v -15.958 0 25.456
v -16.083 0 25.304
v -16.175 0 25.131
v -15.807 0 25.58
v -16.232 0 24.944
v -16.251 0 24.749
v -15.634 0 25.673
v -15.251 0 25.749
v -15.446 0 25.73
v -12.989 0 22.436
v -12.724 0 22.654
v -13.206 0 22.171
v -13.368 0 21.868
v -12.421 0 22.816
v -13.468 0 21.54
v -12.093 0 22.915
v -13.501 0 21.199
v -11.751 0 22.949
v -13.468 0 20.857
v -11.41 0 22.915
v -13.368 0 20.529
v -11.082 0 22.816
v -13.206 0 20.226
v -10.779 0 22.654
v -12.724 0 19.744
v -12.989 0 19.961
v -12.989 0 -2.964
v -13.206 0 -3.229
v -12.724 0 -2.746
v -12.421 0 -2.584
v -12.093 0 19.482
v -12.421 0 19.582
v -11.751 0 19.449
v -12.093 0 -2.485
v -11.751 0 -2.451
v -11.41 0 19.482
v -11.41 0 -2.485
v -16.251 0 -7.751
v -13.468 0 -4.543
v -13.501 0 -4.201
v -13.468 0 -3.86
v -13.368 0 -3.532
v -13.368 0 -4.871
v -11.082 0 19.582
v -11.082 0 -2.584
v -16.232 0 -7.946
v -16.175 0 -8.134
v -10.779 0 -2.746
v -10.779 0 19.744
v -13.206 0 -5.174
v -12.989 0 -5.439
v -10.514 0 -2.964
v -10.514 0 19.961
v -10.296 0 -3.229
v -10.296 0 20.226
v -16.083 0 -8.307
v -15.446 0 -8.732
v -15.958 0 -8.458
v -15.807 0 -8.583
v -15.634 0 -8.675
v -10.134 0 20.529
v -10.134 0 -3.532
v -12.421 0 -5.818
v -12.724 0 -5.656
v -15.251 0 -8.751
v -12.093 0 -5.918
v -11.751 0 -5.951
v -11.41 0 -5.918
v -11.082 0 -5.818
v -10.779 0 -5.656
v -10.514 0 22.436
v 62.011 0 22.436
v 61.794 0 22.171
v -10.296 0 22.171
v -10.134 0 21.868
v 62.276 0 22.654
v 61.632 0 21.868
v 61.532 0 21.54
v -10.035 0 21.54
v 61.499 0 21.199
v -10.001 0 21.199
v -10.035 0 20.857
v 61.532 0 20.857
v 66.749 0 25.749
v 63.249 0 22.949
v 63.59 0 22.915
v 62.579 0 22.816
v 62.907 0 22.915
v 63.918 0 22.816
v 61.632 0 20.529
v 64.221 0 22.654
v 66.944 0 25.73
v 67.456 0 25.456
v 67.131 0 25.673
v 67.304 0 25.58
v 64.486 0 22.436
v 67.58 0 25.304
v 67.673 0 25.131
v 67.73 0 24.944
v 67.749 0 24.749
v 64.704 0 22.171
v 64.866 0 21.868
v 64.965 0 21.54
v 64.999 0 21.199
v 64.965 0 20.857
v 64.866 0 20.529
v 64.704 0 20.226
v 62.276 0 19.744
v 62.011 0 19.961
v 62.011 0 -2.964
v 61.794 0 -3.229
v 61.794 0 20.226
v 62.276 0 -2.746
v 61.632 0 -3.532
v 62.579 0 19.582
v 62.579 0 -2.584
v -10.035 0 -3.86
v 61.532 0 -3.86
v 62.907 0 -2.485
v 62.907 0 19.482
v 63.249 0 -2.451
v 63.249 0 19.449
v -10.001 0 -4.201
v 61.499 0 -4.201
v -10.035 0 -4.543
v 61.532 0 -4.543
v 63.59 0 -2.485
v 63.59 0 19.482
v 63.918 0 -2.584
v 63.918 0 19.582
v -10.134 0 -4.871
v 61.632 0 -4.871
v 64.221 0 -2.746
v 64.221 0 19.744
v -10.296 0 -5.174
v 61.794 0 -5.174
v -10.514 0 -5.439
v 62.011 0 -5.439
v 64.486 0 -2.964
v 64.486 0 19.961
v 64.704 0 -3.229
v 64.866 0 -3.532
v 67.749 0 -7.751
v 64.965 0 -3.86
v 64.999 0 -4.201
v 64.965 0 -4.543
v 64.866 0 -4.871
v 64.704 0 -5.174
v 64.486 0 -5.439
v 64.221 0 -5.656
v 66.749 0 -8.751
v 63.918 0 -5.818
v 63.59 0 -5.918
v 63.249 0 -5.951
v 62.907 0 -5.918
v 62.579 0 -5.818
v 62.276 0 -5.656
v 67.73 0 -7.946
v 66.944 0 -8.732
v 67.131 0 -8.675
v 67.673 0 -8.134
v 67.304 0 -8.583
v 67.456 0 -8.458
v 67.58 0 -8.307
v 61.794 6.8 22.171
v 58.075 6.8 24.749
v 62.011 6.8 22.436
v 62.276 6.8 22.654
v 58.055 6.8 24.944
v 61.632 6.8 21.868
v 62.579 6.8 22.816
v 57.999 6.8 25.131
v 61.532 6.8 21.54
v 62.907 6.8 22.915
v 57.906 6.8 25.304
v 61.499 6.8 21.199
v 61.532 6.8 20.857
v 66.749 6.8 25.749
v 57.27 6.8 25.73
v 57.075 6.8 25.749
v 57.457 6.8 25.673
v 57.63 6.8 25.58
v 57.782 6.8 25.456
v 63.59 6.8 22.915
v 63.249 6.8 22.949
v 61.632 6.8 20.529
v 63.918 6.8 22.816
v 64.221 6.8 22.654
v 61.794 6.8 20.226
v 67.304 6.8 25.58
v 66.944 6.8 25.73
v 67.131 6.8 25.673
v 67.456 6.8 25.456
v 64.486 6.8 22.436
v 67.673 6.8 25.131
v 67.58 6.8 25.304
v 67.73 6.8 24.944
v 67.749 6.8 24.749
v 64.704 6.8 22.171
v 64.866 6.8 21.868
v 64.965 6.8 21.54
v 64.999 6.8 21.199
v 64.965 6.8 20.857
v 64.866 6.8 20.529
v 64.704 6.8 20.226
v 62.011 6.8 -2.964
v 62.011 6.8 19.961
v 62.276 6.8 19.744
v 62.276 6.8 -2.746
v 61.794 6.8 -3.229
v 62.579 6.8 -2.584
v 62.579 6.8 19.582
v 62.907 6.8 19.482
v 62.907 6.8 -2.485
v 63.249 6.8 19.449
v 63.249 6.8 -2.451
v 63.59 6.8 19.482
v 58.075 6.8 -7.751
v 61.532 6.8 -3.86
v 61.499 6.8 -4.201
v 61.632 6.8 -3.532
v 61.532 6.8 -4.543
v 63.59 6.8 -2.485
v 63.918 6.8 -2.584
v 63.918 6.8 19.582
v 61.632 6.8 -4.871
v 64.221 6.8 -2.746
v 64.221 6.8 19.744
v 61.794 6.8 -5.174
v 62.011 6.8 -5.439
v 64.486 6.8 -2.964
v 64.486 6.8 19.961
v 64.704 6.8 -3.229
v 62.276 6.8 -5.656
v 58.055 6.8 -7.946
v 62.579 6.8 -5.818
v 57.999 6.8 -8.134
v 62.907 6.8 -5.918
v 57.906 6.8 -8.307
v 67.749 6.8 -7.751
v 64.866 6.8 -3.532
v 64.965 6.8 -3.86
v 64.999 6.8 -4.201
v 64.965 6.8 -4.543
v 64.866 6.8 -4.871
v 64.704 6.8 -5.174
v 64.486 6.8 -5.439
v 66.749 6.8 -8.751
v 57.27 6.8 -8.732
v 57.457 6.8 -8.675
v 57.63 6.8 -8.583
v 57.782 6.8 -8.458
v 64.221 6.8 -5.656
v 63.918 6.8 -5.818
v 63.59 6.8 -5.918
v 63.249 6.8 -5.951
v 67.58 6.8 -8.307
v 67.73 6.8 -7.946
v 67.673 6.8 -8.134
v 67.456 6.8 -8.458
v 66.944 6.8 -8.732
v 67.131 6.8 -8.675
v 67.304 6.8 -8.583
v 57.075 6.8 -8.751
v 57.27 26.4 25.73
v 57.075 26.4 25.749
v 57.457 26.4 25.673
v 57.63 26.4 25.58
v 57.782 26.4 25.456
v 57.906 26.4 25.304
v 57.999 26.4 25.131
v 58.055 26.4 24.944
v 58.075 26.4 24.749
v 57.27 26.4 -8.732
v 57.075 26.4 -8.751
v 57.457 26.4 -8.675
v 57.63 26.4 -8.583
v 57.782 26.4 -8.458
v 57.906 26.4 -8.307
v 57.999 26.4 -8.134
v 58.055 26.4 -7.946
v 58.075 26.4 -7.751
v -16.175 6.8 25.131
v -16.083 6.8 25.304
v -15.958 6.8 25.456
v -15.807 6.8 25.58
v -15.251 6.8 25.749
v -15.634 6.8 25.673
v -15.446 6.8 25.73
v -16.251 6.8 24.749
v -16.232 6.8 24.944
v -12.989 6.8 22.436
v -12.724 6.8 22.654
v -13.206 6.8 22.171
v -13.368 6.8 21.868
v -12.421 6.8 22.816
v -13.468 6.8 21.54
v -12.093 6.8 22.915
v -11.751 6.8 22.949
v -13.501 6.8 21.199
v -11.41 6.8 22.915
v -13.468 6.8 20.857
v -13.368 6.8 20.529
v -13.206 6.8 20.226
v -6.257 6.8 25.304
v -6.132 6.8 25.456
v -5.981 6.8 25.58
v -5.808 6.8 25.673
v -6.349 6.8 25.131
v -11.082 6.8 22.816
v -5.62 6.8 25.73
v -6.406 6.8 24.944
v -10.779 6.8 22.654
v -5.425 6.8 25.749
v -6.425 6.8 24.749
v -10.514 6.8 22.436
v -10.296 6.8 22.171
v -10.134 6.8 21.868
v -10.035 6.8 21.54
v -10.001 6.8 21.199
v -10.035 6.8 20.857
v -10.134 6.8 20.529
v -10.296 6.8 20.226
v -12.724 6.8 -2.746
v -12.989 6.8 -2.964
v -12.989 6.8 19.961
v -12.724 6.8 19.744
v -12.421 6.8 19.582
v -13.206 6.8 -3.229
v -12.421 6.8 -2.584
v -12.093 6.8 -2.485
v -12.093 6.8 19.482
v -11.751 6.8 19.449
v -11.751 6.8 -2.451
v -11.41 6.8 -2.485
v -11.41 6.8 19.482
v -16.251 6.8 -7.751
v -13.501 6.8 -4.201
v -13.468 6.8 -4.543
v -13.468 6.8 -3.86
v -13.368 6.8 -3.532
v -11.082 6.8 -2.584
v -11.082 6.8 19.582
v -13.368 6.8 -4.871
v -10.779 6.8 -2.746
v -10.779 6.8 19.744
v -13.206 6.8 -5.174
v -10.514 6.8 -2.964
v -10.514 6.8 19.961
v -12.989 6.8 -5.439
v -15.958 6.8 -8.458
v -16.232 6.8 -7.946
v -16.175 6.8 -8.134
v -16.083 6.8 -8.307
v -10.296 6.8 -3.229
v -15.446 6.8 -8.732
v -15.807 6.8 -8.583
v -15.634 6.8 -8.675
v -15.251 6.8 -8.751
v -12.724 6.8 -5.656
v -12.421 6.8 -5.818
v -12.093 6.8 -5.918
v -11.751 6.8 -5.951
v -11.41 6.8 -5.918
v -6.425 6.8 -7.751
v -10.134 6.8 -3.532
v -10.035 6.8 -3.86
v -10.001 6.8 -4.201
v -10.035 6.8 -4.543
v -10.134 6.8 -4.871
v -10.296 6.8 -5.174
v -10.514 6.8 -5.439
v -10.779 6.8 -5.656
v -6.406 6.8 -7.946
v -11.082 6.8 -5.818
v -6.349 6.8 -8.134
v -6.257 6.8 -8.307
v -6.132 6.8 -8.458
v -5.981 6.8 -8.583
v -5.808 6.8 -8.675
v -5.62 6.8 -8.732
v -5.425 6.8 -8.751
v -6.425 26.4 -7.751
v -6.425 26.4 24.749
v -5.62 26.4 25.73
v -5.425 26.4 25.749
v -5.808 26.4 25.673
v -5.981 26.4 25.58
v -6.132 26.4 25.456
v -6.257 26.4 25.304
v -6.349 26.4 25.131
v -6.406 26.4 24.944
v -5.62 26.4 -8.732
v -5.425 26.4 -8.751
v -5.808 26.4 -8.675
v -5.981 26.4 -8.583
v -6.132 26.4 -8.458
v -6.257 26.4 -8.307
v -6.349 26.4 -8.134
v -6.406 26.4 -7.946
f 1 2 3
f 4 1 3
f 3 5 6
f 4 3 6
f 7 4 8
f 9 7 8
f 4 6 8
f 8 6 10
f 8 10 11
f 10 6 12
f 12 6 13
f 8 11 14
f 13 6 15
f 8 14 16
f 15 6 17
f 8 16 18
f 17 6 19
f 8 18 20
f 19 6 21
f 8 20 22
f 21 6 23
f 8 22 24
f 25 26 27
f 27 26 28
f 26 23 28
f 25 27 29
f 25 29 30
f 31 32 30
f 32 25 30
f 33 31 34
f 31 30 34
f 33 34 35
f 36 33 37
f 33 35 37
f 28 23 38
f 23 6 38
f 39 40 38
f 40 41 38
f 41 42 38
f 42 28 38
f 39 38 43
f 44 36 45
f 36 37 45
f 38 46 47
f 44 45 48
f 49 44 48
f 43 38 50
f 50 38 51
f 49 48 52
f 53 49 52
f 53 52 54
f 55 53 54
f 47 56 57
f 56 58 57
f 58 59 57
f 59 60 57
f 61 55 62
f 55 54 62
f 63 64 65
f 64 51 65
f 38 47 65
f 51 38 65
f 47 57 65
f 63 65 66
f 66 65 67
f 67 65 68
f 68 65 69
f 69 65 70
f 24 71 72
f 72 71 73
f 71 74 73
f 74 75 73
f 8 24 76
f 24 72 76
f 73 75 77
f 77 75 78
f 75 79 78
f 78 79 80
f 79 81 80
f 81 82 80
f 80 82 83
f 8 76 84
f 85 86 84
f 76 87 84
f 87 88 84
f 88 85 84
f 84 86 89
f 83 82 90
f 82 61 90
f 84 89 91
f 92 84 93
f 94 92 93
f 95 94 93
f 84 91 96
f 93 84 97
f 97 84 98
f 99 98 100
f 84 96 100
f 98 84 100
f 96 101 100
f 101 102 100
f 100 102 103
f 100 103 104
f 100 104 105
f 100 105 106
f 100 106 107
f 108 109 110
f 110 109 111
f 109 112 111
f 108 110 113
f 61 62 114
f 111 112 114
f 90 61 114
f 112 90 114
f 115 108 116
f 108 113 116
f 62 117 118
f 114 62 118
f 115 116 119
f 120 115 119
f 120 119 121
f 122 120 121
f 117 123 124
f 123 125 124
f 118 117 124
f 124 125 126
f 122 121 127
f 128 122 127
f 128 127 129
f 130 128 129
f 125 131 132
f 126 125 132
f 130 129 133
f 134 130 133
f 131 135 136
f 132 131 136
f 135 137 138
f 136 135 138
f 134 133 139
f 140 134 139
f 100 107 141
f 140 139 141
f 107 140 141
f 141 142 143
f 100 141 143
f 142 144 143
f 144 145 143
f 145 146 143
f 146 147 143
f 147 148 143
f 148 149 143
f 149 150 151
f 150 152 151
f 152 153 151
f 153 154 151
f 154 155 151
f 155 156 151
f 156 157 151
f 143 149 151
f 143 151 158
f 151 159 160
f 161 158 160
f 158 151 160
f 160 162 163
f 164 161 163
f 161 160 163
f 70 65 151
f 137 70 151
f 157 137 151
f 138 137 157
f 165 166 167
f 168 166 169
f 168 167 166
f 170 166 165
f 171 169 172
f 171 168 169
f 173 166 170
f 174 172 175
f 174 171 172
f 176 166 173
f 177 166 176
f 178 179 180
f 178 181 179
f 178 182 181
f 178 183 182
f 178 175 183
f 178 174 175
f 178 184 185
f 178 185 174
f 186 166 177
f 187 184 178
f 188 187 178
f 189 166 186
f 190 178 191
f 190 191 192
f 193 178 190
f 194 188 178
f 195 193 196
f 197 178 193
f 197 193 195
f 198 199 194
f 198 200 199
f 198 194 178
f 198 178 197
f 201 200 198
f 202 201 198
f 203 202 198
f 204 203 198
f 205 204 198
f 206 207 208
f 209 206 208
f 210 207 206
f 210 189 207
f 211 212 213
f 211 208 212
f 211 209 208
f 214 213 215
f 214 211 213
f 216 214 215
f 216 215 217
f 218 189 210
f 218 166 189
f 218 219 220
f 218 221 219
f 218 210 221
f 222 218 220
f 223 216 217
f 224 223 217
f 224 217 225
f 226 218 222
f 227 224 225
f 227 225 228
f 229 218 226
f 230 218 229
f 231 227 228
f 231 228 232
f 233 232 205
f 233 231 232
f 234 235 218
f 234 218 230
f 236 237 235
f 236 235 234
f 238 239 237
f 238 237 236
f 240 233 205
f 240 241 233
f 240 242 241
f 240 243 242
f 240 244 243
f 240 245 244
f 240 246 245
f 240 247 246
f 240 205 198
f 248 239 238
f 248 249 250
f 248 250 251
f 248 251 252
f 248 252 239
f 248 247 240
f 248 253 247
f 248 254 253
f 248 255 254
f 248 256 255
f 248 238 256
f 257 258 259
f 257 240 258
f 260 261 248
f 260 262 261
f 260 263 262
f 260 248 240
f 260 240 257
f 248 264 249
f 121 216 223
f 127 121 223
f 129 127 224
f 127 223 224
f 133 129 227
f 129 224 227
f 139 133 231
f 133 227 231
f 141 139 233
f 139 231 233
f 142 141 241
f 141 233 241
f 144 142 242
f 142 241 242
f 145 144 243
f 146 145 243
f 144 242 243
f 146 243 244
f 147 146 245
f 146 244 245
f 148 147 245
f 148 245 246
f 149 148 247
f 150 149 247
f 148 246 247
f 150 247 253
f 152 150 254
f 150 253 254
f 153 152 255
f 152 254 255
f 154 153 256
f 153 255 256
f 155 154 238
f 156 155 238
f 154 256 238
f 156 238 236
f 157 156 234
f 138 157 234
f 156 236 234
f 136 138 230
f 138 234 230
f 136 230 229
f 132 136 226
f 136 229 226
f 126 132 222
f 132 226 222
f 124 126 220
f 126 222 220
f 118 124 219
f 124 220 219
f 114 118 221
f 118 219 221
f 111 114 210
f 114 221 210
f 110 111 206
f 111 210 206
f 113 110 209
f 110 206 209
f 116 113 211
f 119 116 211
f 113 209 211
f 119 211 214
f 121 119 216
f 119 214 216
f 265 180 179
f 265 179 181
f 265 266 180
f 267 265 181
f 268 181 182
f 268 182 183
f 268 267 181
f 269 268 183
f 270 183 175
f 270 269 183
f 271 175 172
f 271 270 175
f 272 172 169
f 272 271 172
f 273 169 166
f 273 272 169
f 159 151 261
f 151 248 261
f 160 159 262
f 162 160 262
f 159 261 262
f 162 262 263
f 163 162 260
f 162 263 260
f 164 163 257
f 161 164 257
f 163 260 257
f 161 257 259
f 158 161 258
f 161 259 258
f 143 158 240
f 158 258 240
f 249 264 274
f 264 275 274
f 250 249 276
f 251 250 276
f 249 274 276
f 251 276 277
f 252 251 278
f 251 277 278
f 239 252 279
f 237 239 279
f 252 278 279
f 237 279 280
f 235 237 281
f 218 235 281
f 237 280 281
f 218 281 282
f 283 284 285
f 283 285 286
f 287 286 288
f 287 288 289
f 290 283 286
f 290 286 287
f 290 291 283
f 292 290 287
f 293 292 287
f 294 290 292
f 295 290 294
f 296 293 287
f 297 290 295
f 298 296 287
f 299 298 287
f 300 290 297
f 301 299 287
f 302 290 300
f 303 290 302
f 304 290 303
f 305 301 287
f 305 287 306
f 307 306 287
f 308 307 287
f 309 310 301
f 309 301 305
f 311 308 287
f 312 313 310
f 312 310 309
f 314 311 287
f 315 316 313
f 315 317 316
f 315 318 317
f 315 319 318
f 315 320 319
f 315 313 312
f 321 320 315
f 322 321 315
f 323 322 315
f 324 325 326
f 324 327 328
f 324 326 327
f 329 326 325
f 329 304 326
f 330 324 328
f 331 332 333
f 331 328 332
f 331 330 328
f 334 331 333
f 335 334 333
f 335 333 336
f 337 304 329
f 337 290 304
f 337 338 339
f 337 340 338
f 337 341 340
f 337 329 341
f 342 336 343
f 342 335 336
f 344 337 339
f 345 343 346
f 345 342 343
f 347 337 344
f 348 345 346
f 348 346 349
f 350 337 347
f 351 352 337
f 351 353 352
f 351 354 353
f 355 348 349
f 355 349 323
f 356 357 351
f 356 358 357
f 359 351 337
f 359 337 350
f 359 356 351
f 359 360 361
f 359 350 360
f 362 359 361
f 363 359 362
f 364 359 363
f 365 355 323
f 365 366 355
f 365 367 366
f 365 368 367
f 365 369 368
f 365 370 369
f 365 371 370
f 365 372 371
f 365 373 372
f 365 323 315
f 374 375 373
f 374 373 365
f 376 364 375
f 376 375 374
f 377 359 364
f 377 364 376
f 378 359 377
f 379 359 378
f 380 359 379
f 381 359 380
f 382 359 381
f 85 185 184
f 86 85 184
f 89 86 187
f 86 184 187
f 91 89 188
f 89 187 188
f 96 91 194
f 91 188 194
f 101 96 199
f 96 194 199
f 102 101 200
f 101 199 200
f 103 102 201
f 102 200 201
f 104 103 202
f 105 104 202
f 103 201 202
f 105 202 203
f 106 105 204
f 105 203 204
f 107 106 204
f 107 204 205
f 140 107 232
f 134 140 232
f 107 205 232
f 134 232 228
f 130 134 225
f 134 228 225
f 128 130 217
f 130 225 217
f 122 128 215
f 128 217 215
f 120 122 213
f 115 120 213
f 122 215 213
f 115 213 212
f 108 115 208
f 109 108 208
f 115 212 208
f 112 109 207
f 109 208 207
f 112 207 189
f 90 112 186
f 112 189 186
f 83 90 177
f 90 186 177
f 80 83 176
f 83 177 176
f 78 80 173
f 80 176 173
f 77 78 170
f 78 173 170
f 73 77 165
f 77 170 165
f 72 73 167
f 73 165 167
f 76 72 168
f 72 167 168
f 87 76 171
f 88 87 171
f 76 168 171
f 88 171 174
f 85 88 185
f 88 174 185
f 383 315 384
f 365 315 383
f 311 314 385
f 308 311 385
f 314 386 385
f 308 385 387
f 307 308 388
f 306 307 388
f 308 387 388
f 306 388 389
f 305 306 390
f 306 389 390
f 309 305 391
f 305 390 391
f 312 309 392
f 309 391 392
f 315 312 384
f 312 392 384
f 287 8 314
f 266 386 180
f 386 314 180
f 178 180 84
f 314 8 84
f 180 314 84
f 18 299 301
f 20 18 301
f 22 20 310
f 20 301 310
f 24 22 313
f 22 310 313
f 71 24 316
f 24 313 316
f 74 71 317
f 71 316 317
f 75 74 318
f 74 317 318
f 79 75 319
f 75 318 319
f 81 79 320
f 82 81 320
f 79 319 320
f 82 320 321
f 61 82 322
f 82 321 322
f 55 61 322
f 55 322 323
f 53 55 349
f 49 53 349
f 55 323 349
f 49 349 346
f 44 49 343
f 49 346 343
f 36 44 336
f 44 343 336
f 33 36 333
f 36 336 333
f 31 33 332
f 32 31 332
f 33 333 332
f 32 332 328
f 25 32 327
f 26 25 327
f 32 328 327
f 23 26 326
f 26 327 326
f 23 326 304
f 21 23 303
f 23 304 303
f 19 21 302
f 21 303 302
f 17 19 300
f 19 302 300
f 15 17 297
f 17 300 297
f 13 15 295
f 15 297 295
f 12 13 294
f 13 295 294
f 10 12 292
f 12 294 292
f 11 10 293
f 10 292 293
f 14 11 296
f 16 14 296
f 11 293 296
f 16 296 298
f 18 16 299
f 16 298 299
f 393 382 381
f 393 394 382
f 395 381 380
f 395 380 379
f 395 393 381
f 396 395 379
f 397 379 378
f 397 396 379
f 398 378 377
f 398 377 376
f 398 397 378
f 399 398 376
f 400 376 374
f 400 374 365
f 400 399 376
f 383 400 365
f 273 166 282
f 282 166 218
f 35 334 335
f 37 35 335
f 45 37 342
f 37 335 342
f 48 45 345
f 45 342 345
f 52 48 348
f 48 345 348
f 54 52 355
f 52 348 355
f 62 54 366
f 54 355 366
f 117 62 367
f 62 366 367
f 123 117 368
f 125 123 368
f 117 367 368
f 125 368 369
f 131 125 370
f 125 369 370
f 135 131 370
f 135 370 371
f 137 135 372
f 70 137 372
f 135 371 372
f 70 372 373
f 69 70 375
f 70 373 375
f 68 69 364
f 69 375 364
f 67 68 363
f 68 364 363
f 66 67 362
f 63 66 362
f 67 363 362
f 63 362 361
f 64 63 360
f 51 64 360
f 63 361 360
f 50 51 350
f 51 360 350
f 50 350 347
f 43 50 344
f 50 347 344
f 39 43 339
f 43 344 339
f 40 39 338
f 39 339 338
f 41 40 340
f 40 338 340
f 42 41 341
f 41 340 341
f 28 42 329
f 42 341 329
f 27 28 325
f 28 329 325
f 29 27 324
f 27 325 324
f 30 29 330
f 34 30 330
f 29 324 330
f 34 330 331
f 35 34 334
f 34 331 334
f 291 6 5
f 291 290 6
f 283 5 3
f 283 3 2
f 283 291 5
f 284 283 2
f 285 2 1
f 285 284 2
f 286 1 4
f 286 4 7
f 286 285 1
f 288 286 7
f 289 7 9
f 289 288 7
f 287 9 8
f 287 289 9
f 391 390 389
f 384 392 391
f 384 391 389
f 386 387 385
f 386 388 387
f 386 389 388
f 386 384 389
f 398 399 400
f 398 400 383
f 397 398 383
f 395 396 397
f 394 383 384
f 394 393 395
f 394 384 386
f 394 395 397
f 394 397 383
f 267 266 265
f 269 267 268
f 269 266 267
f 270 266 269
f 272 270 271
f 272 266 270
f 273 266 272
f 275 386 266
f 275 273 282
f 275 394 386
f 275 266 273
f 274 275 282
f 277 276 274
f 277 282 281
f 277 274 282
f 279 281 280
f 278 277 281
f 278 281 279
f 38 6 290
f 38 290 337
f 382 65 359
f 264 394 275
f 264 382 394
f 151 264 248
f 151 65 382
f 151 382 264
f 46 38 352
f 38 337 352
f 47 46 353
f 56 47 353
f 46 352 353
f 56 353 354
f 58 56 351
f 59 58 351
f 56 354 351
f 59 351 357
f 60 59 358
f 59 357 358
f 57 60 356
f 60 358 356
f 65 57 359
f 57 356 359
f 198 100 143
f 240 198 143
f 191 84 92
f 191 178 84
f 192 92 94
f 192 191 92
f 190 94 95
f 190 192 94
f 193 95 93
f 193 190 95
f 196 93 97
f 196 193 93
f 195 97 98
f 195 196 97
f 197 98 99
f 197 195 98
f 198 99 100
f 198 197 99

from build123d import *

# Parameters (mm, degrees)
SKETCH1_W           = 84
SKETCH1_H           = 34.5
BOSS_EXTRUDE1_DEPTH = 6.8
SKETCH2_W           = 64.5
SKETCH2_H           = 34.5
BOSS_EXTRUDE2_DEPTH = 19.6
SKETCH3_R           = 1.75
CUT_EXTRUDE1_DEPTH  = 6.8
FILLET1_R           = 1
FILLET2_R           = 1


with BuildPart() as part:
    # Sketch1 → Boss-Extrude1 (new body)
    with BuildSketch(Plane(origin=(0, 0, 0), x_dir=(1, 0, 0), z_dir=(0, 1, 0))):
        with Locations((25.748743719, -8.498743719)):
            Rectangle(SKETCH1_W, SKETCH1_H)
    extrude(amount=BOSS_EXTRUDE1_DEPTH)

    # Sketch2 → Boss-Extrude2 (add)
    with BuildSketch(Plane(origin=(0, 6.8, 0), x_dir=(1, 0, 0), z_dir=(0, 1, 0))):
        with Locations((25.824659205, -8.498743719)):
            Rectangle(SKETCH2_W, SKETCH2_H)
    extrude(amount=BOSS_EXTRUDE2_DEPTH)

    # Sketch3 → Cut-Extrude1 (cut)
    with BuildSketch(Plane(origin=(0, 6.8, 0), x_dir=(1, 0, 0), z_dir=(0, 1, 0))):
        with Locations(Location((63.248743719, 4.201256281, 0), (0, 0, 270))):
            Circle(SKETCH3_R)
        with Locations(Location((63.248743719, -21.198743719, 0), (0, 0, 270))):
            Circle(SKETCH3_R)
        with Locations(Location((-11.751256281, -21.198743719, 0), (0, 0, 270))):
            Circle(SKETCH3_R)
        with Locations(Location((-11.751256281, 4.201256281, 0), (0, 0, 270))):
            Circle(SKETCH3_R)
    extrude(amount=-CUT_EXTRUDE1_DEPTH, mode=Mode.SUBTRACT)

    # Fillet1
    fillet1_edges = [part.edges().sort_by_distance(p)[0] for p in [
        (-16.251256281, 3.4, -8.751256281),
        (67.748743719, 3.4, -8.751256281),
        (67.748743719, 3.4, 25.748743719),
        (-16.251256281, 3.4, 25.748743719),
    ]]
    fillet(fillet1_edges, radius=FILLET1_R)

    # Fillet2
    fillet2_edges = [part.edges().sort_by_distance(p)[0] for p in [
        (-6.425340795, 16.6, -8.751256281),
        (-6.425340795, 16.6, 25.748743719),
        (58.074659205, 16.6, 25.748743719),
        (58.074659205, 16.6, -8.751256281),
    ]]
    fillet(fillet2_edges, radius=FILLET2_R)


solid = part.part
